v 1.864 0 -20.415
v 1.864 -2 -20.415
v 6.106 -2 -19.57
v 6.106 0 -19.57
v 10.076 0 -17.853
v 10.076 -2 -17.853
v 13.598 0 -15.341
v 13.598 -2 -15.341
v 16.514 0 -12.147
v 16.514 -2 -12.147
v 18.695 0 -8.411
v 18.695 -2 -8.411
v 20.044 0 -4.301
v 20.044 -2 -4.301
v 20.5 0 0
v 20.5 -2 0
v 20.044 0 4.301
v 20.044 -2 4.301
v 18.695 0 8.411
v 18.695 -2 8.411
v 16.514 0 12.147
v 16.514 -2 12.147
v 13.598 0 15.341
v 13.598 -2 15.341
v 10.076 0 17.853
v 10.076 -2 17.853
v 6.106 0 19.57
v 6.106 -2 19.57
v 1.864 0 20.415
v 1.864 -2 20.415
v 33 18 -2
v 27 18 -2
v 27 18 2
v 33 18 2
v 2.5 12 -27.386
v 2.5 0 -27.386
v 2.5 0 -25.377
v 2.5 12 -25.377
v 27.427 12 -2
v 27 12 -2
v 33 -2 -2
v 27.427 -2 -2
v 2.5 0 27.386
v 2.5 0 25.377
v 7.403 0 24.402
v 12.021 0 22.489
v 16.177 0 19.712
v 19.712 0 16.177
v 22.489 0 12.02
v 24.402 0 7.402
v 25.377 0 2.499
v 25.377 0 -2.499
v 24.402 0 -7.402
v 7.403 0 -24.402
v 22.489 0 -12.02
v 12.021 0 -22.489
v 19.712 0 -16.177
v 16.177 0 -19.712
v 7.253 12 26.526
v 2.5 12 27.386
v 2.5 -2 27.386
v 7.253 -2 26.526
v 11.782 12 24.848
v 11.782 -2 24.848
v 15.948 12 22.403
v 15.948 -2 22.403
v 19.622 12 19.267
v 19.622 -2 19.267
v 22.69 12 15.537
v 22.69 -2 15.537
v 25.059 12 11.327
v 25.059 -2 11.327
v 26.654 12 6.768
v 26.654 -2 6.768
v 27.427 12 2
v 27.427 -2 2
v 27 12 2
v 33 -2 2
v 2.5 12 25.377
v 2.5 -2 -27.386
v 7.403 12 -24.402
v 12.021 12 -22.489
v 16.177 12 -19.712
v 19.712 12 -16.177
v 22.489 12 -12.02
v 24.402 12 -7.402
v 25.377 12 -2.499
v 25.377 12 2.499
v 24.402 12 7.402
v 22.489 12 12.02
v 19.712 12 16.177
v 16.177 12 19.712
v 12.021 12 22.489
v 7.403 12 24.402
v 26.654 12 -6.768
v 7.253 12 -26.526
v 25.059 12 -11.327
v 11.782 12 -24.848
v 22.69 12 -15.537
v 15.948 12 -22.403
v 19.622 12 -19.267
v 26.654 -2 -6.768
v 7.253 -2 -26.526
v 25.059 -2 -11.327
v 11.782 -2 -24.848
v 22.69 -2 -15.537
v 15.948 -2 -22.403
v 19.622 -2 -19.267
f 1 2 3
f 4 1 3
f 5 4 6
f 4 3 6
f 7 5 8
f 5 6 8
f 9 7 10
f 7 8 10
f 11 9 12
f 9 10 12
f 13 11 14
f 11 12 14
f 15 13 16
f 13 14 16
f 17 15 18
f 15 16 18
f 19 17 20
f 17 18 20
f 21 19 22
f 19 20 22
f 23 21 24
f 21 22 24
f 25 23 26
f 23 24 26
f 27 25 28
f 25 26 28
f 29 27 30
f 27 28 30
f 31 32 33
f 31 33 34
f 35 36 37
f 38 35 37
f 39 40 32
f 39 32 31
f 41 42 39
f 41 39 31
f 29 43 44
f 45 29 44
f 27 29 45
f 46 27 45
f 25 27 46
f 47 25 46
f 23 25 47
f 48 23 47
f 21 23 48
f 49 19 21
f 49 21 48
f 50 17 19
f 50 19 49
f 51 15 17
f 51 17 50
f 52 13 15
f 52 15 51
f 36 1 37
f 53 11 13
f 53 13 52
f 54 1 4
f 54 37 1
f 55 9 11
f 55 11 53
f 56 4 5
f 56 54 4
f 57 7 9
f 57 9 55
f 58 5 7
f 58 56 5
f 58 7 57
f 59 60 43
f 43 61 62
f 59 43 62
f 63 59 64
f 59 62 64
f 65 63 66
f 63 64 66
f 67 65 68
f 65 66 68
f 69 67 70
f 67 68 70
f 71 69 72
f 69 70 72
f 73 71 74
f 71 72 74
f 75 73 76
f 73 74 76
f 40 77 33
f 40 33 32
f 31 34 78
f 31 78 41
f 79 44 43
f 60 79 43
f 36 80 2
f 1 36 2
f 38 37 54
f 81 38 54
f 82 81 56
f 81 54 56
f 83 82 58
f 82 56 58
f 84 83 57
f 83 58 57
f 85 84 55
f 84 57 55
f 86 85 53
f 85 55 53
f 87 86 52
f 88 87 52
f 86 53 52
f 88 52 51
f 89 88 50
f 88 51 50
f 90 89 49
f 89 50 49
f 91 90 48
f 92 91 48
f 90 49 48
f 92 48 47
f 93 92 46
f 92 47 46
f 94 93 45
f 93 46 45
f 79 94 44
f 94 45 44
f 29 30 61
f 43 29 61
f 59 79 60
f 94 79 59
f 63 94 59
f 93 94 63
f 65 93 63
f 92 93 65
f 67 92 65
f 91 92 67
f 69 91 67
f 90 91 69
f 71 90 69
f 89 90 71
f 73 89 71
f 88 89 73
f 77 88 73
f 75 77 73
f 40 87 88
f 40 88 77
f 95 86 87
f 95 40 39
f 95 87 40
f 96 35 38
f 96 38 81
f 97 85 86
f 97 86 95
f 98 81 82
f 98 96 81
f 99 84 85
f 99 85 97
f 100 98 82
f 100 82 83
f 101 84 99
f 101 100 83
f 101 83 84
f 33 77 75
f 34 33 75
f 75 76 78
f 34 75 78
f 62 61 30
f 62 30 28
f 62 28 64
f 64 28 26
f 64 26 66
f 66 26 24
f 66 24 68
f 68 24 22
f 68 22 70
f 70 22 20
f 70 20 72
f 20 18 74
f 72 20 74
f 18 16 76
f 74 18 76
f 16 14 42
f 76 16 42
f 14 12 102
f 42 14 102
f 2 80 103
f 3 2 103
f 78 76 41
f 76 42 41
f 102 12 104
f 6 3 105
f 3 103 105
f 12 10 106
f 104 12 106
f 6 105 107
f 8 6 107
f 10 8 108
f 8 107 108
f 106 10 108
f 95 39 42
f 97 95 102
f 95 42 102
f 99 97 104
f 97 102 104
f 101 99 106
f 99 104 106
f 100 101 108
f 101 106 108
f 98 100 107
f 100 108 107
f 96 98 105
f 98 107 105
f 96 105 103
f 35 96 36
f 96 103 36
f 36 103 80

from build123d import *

# Parameters (mm, degrees)
BOSS_EXTRUDE1_DEPTH = 12
BOSS_EXTRUDE2_START = -2
BOSS_EXTRUDE2_DEPTH = 2
SKETCH4_W           = 6
SKETCH4_H           = 4
BOSS_EXTRUDE3_DEPTH = 20


with BuildPart() as part:
    # Sketch1 → Boss-Extrude1 (new body)
    with BuildSketch(Plane(origin=(0, 0, 0), x_dir=(1, 0, 0), z_dir=(0, 1, 0))):
        with BuildLine():
            Line((2.5, 27.386127875), (2.5, 25.377155081))
            ThreePointArc((2.5, 25.377155081), (25.5, 0), (2.5, -25.377155081))
            Line((2.5, -25.377155081), (2.5, -27.386127875))
            ThreePointArc((2.5, -27.386127875), (27.5, 0), (2.5, 27.386127875))
        make_face()
    extrude(amount=BOSS_EXTRUDE1_DEPTH)

    # Sketch2 → Boss-Extrude2 (add)
    with BuildSketch(Plane(origin=(0, 0, 0), x_dir=(1, 0, 0), z_dir=(0, 1, 0)).offset(BOSS_EXTRUDE2_START)):
        with BuildLine():
            Line((2.5, 27.386127875), (1.863636364, 20.415113507))
            ThreePointArc((1.863636364, 20.415113507), (20.5, 0), (1.863636364, -20.415113507))
            Line((1.863636364, -20.415113507), (2.5, -27.386127875))
            ThreePointArc((2.5, -27.386127875), (27.5, 0), (2.5, 27.386127875))
        make_face()
    extrude(amount=BOSS_EXTRUDE2_DEPTH)

    # Sketch4 → Boss-Extrude3 (add)
    with BuildSketch(Plane(origin=(0, -2, 0), x_dir=(1, 0, 0), z_dir=(0, 1, 0))):
        with Locations((30, 0)):
            Rectangle(SKETCH4_W, SKETCH4_H)
    extrude(amount=BOSS_EXTRUDE3_DEPTH)


solid = part.part
